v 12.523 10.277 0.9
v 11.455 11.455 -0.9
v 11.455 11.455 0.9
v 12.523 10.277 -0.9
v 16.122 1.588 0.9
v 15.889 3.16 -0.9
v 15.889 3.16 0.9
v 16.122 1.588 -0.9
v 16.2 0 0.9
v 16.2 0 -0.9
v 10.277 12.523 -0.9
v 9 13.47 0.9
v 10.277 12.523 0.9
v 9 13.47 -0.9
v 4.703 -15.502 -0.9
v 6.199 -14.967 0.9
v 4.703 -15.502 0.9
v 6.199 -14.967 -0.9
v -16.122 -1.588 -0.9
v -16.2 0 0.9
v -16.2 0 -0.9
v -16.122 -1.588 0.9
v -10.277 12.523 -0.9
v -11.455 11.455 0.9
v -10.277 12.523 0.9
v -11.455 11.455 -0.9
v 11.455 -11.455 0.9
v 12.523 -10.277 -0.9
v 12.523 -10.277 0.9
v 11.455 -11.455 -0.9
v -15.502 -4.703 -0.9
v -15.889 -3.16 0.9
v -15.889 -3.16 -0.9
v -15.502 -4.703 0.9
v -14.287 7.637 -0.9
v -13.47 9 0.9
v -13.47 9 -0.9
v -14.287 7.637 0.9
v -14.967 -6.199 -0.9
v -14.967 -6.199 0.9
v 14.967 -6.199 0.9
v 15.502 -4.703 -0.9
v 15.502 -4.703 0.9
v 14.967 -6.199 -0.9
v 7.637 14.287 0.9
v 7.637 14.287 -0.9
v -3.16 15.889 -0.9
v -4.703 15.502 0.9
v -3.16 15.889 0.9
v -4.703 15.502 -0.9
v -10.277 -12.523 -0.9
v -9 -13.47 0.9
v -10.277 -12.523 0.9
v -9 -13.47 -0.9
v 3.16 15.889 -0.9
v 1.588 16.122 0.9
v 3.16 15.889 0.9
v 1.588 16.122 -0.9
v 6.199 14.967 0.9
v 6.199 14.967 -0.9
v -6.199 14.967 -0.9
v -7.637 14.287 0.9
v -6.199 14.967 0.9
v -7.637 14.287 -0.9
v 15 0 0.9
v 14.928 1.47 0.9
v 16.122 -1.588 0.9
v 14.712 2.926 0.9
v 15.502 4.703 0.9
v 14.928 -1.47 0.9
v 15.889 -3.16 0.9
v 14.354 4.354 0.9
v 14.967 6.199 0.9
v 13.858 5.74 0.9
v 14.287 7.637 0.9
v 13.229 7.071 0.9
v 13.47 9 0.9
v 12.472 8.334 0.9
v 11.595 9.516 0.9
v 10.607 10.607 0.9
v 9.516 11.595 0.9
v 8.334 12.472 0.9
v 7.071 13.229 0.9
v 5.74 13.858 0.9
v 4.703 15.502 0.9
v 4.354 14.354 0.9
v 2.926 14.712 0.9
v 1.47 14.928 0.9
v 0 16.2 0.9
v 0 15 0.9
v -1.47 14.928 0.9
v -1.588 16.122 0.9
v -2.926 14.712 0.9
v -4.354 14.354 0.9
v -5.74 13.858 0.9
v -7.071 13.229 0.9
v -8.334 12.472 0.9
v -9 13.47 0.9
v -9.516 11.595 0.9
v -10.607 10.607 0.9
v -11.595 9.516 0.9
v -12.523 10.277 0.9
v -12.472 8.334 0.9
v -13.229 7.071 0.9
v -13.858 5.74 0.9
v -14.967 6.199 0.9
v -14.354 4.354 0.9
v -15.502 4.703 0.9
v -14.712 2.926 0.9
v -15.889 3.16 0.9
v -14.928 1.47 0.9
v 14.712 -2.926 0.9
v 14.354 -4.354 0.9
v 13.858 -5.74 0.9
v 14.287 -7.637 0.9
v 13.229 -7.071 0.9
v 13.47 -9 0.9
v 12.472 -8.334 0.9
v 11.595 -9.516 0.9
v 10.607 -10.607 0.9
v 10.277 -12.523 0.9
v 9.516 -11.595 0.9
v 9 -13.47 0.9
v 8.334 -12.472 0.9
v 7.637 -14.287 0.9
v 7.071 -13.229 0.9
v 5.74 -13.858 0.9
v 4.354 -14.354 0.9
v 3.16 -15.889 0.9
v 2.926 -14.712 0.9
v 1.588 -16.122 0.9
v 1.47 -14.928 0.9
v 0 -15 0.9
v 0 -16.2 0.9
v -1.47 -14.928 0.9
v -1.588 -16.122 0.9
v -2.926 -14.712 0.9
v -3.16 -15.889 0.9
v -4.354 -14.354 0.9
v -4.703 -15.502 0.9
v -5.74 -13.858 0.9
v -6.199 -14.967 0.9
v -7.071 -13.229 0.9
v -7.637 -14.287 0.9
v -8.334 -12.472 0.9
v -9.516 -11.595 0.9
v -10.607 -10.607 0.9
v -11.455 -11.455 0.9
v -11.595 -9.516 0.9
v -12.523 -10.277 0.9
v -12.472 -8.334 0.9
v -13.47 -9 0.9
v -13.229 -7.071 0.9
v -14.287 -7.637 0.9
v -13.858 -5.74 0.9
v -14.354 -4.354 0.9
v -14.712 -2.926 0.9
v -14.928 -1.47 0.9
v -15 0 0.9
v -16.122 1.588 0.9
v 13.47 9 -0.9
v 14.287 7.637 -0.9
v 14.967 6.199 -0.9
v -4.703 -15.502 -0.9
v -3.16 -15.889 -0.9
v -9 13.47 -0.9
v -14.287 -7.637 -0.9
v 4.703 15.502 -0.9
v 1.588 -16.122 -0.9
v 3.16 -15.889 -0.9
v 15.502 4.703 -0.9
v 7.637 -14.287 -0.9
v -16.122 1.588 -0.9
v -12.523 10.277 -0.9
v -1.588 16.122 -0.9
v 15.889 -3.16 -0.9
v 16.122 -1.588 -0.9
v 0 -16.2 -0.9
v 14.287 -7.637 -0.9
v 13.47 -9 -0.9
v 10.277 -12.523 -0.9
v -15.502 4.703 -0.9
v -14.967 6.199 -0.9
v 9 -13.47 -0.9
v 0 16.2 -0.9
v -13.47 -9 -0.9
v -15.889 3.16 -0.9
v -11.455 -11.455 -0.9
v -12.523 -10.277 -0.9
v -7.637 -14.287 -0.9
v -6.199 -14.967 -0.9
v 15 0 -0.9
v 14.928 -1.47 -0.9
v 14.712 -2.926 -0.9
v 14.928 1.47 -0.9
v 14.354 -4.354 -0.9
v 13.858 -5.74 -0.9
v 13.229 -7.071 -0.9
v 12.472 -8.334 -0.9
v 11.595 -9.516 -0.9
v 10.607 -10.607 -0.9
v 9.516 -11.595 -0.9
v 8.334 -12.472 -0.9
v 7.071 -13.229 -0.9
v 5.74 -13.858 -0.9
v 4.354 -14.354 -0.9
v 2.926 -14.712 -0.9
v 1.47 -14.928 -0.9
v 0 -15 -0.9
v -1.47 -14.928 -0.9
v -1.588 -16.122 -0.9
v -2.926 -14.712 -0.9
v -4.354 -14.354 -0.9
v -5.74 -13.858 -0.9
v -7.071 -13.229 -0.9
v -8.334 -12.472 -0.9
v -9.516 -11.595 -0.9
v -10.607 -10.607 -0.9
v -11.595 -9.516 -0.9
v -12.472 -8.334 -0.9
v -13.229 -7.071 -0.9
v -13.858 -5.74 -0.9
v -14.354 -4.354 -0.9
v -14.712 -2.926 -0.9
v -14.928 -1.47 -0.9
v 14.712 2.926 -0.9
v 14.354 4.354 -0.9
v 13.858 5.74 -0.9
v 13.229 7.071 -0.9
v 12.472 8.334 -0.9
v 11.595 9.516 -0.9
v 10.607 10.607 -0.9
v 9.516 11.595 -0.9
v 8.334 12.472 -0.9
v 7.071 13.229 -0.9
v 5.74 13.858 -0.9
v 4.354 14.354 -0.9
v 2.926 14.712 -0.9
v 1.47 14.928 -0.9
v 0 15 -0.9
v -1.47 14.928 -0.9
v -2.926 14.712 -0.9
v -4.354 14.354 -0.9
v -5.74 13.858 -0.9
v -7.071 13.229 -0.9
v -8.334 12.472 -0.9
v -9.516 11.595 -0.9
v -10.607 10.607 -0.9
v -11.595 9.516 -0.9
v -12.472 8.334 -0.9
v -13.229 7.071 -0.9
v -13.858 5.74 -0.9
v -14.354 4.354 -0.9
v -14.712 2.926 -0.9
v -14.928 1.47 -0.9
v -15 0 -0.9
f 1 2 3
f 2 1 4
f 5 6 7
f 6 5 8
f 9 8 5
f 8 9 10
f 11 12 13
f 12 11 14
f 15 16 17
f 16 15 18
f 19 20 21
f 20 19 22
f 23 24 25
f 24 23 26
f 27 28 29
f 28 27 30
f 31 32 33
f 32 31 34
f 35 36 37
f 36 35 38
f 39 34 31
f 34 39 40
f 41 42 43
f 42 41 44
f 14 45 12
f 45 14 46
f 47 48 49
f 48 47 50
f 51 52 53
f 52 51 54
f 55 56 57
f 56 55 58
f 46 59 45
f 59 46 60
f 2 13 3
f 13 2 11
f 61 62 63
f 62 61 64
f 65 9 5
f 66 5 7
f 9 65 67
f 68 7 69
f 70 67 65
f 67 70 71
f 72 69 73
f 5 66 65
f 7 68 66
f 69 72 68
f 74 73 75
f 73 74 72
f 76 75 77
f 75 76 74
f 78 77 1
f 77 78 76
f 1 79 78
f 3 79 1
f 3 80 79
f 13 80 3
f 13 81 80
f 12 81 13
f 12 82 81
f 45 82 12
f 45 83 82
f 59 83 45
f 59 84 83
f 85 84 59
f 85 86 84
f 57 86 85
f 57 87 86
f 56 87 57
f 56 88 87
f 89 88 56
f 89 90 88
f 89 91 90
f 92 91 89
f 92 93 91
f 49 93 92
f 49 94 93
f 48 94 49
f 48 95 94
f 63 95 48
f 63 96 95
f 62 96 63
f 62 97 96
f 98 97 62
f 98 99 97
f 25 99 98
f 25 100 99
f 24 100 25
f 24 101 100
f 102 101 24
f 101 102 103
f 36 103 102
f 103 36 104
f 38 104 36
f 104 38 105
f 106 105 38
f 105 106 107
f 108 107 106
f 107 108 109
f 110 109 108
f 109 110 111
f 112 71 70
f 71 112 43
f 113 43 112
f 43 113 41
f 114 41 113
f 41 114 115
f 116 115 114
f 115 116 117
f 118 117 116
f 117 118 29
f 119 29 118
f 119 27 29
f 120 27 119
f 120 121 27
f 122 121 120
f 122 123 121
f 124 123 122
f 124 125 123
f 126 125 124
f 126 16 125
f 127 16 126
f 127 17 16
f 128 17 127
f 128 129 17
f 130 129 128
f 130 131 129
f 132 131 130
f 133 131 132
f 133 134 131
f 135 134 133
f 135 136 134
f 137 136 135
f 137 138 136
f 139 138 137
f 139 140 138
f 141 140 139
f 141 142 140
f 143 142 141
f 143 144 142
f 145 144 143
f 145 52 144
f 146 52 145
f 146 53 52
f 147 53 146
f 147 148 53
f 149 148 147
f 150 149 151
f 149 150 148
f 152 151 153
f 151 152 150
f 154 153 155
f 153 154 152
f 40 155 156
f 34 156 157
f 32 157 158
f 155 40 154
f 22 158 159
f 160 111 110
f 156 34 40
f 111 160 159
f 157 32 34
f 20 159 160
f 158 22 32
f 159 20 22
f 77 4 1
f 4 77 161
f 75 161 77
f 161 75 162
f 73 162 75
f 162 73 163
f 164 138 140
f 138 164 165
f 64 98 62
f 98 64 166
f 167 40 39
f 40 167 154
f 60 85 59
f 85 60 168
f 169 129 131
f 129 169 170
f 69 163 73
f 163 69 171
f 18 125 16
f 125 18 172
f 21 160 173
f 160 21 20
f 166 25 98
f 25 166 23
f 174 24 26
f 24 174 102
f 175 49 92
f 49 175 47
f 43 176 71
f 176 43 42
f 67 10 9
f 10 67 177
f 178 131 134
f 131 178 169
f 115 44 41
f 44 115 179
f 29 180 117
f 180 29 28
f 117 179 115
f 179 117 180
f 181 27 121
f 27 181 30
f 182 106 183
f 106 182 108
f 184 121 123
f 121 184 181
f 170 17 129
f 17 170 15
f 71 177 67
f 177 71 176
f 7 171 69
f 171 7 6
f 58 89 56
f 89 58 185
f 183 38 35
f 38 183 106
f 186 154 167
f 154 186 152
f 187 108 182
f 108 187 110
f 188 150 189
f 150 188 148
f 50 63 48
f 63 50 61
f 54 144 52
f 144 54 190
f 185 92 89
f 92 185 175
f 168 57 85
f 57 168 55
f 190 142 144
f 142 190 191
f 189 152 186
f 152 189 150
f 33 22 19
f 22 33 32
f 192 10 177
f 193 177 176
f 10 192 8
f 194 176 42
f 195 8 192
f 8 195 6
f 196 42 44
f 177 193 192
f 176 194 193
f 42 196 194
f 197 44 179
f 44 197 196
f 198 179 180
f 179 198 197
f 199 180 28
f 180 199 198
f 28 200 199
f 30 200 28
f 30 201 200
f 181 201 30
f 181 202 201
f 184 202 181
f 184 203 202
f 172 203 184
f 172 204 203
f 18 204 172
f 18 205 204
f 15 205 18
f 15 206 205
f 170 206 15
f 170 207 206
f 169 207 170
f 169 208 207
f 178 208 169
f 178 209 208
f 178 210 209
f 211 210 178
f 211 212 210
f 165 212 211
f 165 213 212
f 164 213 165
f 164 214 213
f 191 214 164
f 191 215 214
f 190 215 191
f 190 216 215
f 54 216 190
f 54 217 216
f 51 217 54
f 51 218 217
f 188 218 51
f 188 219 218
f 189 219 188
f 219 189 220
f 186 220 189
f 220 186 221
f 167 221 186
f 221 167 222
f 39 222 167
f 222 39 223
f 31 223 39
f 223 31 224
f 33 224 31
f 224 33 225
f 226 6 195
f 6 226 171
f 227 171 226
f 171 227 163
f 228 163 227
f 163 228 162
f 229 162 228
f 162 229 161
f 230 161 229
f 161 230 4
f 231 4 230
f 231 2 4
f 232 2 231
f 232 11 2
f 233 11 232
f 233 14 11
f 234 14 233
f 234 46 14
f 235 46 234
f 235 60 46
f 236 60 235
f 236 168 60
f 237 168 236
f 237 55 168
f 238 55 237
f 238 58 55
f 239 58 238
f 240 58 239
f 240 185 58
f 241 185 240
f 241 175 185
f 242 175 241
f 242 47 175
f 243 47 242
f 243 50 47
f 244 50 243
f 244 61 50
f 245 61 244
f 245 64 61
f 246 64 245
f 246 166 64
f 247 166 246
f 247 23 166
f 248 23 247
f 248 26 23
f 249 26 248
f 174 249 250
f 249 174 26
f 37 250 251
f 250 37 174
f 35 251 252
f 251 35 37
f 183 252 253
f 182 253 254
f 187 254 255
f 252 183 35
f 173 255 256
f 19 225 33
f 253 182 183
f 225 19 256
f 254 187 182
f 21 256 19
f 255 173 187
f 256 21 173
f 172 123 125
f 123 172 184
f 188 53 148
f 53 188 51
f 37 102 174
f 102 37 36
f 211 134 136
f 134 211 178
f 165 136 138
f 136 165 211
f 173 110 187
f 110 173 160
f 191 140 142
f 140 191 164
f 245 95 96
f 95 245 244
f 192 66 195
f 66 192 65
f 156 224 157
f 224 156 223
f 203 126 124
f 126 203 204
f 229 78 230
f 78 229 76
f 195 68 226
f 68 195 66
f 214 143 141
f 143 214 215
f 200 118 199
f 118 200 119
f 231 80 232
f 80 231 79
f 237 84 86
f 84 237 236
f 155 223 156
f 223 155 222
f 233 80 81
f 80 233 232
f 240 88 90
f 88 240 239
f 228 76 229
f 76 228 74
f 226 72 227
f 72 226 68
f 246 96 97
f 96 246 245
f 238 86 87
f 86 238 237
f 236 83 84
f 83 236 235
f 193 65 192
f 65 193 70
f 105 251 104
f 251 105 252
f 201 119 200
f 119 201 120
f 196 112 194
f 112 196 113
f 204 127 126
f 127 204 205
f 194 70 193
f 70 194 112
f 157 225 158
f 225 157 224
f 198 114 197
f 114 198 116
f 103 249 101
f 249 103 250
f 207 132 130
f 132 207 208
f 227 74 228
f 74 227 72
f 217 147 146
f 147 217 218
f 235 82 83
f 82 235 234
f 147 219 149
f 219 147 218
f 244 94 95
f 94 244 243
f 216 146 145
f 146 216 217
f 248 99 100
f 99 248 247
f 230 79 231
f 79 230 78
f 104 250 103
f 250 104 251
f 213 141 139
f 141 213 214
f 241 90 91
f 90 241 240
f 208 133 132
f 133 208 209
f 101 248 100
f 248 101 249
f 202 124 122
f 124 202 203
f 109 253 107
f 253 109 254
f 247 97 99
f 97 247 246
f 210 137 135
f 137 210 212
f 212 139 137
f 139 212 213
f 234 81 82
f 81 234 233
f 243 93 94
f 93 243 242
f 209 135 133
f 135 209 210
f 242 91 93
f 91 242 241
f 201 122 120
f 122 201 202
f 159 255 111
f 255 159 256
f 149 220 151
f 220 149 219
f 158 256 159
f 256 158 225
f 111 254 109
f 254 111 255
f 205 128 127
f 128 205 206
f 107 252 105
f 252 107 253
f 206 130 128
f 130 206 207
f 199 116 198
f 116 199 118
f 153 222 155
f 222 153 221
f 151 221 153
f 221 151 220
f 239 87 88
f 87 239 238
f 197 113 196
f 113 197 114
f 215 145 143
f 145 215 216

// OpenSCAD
/******************************************************************
*                                                                 *
* OpenFlexure Microscope: actuator tension band                   *
*                                                                 *
* The microscope stage actuators need a tension band to provide a *
* reciprocal force between the captive nut in the gear and the    *
* stage arm. The recommendation is to use a Viton O-ring, but if  *
* you have a 3d printer can reliably print with TPU filament, you *
* can print this instead and use it in place of the O-ring.       *
*                                                                 *
* Print this part using .1mm layer height, with randomized        *
* perimeter start and end positions if possible. For strength,    *
* The part should be printed entirely with perimeters, no gap     *
* fill. The part is designed to be printed with a 0.4mm nozzle.   *
* Printing with a 1mm nozzle hasn't been tested, and isn't        *
* recommended.
*                                                                 *
* (c) Bill Schaller, June 2020                                    *
* Released under the CERN Open Hardware License v1.2              *
*                                                                 *
******************************************************************/


$fn = 64;

actuator_tension_band(nozzle_width=0.4);

module actuator_tension_band(nozzle_width){
    band_height = 1.8;
    ideal_band_thickness = 1.5;
    band_inner_diameter = 30;

    actual_band_thickness = ideal_band_thickness - (ideal_band_thickness % nozzle_width);
    band_outer_diameter = band_inner_diameter + actual_band_thickness * 2;

    difference(){
        cylinder(h=band_height, d=band_outer_diameter, center = true);
        cylinder(h=band_height+1, d=band_inner_diameter, center = true);
    }
}
